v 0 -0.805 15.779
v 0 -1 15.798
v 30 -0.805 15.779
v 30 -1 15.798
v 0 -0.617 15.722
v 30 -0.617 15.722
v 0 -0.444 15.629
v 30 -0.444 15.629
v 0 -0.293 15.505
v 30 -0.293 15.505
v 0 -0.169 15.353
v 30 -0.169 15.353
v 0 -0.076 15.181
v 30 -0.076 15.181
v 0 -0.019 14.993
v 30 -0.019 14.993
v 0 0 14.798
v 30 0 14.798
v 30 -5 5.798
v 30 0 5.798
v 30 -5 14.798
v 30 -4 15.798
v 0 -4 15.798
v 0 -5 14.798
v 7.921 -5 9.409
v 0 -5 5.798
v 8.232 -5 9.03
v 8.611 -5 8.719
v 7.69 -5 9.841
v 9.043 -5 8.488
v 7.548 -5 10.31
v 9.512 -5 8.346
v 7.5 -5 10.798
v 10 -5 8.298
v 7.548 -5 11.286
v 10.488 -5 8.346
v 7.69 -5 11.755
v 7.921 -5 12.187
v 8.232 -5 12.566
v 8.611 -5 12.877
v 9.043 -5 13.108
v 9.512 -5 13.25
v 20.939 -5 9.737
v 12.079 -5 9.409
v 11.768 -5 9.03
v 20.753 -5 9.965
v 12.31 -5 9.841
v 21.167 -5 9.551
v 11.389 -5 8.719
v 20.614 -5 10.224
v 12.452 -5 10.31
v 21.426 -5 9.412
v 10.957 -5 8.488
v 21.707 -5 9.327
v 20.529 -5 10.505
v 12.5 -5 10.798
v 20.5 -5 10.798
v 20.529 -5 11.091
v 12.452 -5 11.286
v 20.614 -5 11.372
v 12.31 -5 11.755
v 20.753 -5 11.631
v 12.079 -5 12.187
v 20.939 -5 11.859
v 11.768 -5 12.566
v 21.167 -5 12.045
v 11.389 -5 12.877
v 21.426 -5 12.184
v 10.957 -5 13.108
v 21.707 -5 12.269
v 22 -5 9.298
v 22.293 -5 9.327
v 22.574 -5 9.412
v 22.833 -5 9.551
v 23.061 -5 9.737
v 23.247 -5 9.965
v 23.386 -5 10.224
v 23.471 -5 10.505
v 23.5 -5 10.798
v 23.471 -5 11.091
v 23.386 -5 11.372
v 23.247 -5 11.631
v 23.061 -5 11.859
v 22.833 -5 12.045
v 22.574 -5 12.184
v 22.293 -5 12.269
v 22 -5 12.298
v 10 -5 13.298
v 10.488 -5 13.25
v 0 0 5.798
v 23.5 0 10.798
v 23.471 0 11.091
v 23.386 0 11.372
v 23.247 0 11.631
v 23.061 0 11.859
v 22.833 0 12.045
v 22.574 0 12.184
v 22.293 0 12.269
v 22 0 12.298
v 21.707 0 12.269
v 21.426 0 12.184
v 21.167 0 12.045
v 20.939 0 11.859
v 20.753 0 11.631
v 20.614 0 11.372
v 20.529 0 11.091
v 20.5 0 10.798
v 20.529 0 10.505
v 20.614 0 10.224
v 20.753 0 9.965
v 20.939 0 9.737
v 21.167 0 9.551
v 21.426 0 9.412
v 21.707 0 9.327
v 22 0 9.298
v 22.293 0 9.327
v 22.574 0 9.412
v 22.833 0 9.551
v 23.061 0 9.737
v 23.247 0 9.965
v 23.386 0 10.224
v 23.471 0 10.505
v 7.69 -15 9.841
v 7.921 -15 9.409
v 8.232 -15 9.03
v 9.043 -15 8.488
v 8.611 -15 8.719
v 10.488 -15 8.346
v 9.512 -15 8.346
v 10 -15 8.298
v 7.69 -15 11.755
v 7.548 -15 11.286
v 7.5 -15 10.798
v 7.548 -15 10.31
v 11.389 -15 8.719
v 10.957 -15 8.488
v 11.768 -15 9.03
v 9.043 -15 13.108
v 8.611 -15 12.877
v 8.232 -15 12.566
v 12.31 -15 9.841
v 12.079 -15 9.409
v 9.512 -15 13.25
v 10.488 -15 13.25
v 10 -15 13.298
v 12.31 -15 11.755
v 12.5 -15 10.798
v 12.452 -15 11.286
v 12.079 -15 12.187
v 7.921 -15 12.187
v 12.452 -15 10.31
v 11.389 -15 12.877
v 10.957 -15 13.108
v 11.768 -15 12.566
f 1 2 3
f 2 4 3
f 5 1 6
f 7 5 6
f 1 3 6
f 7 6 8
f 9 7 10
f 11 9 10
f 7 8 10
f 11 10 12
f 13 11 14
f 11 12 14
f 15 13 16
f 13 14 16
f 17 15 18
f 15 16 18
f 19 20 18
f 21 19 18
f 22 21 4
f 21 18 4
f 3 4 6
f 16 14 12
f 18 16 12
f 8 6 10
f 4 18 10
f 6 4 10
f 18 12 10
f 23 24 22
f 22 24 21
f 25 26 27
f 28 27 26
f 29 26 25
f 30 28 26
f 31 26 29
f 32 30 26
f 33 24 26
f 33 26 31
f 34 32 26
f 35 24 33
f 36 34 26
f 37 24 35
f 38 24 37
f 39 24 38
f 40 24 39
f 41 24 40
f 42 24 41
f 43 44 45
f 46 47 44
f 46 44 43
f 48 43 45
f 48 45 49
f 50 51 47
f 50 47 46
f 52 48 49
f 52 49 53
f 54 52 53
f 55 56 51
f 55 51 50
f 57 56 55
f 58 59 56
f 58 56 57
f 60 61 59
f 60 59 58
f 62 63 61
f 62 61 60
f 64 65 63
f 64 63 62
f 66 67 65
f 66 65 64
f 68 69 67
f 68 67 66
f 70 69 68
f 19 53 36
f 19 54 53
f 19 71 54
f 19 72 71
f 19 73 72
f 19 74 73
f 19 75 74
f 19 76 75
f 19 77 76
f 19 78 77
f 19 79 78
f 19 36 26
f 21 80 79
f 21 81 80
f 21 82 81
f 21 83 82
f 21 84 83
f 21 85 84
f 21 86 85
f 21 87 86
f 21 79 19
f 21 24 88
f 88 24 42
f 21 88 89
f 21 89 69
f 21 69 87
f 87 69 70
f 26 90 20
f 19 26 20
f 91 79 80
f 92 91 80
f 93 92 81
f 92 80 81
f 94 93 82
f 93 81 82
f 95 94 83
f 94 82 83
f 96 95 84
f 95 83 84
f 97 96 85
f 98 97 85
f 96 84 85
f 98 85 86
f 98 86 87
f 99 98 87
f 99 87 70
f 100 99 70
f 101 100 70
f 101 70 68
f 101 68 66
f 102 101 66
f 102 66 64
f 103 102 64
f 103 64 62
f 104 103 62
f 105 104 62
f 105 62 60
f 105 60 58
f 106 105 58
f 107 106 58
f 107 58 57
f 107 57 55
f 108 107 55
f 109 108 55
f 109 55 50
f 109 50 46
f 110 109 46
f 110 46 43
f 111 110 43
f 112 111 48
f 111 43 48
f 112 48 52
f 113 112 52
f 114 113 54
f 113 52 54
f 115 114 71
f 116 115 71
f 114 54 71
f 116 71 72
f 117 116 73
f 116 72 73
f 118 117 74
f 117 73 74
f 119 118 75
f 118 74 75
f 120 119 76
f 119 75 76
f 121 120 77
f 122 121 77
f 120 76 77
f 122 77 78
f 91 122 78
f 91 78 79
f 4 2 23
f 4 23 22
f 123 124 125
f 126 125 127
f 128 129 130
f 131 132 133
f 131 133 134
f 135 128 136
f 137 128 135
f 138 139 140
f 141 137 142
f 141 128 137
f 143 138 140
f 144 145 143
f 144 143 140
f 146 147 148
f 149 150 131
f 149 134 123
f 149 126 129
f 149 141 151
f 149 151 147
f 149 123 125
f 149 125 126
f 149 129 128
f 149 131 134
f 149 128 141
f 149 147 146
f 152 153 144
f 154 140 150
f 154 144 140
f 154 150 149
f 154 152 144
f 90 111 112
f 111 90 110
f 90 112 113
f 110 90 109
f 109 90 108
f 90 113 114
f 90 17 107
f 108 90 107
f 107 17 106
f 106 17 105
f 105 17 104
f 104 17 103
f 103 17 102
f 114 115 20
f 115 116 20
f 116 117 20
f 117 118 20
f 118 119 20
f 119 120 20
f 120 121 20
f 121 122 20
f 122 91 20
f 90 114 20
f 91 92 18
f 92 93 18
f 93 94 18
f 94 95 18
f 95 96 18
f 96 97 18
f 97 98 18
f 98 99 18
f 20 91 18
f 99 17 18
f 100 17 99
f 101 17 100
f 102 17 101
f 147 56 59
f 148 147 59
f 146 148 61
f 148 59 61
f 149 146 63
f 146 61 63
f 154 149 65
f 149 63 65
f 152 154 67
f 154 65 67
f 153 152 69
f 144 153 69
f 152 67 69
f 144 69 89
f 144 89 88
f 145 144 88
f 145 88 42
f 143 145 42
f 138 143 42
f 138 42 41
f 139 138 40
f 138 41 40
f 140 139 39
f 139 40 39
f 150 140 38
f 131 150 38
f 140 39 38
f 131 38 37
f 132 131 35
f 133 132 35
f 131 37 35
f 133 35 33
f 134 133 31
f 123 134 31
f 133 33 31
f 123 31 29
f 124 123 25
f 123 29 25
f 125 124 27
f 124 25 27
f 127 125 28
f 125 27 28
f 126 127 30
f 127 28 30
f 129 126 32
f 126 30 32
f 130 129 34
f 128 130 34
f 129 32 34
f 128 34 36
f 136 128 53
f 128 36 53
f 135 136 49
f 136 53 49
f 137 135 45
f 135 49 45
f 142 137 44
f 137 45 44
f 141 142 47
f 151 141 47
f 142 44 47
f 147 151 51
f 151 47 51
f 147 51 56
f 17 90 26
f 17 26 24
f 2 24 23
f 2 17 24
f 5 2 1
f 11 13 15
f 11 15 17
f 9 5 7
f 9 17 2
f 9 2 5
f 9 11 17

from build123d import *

# Parameters (mm, degrees)
F0_W     = 30
F0_H     = 10
F1_DEPTH = 5
F2_R     = 2.5
F3_DEPTH = 10
F4_R     = 1.5
F5_DEPTH = 5.001
F6_SIZE  = 1
F7_R     = 1


# Not quite as in the source:
# - a feature names something its author has since deleted; it is built from what else it names


with BuildPart() as f1:
    # F0 (on Front) → F1 (new body)
    with BuildSketch(Plane.XZ):
        with Locations((15, 10.7978725549)):
            Rectangle(F0_W, F0_H)
    extrude(amount=F1_DEPTH)

    # F2 (on face) → F3 (join)
    with BuildSketch(Plane.XZ.offset(5)):
        with Locations((10, 10.7978725549)):
            Circle(F2_R)
    extrude(amount=F3_DEPTH)

    # F4 (on face) → F5 (cut, through all)
    with BuildSketch(Plane.XZ.offset(5)):
        with Locations((22, 10.7978725549)):
            Circle(F4_R)
    extrude(amount=-F5_DEPTH, mode=Mode.SUBTRACT)

    # F6
    f6_edges = [f1.edges().sort_by_distance(p)[0] for p in [
        (15, -5, 15.797873),
    ]]
    chamfer(f6_edges, length=F6_SIZE)

    # F7
    f7_edges = [f1.edges().sort_by_distance(p)[0] for p in [
        (15, 0, 15.797873),
    ]]
    fillet(f7_edges, radius=F7_R)


solid = f1.part
